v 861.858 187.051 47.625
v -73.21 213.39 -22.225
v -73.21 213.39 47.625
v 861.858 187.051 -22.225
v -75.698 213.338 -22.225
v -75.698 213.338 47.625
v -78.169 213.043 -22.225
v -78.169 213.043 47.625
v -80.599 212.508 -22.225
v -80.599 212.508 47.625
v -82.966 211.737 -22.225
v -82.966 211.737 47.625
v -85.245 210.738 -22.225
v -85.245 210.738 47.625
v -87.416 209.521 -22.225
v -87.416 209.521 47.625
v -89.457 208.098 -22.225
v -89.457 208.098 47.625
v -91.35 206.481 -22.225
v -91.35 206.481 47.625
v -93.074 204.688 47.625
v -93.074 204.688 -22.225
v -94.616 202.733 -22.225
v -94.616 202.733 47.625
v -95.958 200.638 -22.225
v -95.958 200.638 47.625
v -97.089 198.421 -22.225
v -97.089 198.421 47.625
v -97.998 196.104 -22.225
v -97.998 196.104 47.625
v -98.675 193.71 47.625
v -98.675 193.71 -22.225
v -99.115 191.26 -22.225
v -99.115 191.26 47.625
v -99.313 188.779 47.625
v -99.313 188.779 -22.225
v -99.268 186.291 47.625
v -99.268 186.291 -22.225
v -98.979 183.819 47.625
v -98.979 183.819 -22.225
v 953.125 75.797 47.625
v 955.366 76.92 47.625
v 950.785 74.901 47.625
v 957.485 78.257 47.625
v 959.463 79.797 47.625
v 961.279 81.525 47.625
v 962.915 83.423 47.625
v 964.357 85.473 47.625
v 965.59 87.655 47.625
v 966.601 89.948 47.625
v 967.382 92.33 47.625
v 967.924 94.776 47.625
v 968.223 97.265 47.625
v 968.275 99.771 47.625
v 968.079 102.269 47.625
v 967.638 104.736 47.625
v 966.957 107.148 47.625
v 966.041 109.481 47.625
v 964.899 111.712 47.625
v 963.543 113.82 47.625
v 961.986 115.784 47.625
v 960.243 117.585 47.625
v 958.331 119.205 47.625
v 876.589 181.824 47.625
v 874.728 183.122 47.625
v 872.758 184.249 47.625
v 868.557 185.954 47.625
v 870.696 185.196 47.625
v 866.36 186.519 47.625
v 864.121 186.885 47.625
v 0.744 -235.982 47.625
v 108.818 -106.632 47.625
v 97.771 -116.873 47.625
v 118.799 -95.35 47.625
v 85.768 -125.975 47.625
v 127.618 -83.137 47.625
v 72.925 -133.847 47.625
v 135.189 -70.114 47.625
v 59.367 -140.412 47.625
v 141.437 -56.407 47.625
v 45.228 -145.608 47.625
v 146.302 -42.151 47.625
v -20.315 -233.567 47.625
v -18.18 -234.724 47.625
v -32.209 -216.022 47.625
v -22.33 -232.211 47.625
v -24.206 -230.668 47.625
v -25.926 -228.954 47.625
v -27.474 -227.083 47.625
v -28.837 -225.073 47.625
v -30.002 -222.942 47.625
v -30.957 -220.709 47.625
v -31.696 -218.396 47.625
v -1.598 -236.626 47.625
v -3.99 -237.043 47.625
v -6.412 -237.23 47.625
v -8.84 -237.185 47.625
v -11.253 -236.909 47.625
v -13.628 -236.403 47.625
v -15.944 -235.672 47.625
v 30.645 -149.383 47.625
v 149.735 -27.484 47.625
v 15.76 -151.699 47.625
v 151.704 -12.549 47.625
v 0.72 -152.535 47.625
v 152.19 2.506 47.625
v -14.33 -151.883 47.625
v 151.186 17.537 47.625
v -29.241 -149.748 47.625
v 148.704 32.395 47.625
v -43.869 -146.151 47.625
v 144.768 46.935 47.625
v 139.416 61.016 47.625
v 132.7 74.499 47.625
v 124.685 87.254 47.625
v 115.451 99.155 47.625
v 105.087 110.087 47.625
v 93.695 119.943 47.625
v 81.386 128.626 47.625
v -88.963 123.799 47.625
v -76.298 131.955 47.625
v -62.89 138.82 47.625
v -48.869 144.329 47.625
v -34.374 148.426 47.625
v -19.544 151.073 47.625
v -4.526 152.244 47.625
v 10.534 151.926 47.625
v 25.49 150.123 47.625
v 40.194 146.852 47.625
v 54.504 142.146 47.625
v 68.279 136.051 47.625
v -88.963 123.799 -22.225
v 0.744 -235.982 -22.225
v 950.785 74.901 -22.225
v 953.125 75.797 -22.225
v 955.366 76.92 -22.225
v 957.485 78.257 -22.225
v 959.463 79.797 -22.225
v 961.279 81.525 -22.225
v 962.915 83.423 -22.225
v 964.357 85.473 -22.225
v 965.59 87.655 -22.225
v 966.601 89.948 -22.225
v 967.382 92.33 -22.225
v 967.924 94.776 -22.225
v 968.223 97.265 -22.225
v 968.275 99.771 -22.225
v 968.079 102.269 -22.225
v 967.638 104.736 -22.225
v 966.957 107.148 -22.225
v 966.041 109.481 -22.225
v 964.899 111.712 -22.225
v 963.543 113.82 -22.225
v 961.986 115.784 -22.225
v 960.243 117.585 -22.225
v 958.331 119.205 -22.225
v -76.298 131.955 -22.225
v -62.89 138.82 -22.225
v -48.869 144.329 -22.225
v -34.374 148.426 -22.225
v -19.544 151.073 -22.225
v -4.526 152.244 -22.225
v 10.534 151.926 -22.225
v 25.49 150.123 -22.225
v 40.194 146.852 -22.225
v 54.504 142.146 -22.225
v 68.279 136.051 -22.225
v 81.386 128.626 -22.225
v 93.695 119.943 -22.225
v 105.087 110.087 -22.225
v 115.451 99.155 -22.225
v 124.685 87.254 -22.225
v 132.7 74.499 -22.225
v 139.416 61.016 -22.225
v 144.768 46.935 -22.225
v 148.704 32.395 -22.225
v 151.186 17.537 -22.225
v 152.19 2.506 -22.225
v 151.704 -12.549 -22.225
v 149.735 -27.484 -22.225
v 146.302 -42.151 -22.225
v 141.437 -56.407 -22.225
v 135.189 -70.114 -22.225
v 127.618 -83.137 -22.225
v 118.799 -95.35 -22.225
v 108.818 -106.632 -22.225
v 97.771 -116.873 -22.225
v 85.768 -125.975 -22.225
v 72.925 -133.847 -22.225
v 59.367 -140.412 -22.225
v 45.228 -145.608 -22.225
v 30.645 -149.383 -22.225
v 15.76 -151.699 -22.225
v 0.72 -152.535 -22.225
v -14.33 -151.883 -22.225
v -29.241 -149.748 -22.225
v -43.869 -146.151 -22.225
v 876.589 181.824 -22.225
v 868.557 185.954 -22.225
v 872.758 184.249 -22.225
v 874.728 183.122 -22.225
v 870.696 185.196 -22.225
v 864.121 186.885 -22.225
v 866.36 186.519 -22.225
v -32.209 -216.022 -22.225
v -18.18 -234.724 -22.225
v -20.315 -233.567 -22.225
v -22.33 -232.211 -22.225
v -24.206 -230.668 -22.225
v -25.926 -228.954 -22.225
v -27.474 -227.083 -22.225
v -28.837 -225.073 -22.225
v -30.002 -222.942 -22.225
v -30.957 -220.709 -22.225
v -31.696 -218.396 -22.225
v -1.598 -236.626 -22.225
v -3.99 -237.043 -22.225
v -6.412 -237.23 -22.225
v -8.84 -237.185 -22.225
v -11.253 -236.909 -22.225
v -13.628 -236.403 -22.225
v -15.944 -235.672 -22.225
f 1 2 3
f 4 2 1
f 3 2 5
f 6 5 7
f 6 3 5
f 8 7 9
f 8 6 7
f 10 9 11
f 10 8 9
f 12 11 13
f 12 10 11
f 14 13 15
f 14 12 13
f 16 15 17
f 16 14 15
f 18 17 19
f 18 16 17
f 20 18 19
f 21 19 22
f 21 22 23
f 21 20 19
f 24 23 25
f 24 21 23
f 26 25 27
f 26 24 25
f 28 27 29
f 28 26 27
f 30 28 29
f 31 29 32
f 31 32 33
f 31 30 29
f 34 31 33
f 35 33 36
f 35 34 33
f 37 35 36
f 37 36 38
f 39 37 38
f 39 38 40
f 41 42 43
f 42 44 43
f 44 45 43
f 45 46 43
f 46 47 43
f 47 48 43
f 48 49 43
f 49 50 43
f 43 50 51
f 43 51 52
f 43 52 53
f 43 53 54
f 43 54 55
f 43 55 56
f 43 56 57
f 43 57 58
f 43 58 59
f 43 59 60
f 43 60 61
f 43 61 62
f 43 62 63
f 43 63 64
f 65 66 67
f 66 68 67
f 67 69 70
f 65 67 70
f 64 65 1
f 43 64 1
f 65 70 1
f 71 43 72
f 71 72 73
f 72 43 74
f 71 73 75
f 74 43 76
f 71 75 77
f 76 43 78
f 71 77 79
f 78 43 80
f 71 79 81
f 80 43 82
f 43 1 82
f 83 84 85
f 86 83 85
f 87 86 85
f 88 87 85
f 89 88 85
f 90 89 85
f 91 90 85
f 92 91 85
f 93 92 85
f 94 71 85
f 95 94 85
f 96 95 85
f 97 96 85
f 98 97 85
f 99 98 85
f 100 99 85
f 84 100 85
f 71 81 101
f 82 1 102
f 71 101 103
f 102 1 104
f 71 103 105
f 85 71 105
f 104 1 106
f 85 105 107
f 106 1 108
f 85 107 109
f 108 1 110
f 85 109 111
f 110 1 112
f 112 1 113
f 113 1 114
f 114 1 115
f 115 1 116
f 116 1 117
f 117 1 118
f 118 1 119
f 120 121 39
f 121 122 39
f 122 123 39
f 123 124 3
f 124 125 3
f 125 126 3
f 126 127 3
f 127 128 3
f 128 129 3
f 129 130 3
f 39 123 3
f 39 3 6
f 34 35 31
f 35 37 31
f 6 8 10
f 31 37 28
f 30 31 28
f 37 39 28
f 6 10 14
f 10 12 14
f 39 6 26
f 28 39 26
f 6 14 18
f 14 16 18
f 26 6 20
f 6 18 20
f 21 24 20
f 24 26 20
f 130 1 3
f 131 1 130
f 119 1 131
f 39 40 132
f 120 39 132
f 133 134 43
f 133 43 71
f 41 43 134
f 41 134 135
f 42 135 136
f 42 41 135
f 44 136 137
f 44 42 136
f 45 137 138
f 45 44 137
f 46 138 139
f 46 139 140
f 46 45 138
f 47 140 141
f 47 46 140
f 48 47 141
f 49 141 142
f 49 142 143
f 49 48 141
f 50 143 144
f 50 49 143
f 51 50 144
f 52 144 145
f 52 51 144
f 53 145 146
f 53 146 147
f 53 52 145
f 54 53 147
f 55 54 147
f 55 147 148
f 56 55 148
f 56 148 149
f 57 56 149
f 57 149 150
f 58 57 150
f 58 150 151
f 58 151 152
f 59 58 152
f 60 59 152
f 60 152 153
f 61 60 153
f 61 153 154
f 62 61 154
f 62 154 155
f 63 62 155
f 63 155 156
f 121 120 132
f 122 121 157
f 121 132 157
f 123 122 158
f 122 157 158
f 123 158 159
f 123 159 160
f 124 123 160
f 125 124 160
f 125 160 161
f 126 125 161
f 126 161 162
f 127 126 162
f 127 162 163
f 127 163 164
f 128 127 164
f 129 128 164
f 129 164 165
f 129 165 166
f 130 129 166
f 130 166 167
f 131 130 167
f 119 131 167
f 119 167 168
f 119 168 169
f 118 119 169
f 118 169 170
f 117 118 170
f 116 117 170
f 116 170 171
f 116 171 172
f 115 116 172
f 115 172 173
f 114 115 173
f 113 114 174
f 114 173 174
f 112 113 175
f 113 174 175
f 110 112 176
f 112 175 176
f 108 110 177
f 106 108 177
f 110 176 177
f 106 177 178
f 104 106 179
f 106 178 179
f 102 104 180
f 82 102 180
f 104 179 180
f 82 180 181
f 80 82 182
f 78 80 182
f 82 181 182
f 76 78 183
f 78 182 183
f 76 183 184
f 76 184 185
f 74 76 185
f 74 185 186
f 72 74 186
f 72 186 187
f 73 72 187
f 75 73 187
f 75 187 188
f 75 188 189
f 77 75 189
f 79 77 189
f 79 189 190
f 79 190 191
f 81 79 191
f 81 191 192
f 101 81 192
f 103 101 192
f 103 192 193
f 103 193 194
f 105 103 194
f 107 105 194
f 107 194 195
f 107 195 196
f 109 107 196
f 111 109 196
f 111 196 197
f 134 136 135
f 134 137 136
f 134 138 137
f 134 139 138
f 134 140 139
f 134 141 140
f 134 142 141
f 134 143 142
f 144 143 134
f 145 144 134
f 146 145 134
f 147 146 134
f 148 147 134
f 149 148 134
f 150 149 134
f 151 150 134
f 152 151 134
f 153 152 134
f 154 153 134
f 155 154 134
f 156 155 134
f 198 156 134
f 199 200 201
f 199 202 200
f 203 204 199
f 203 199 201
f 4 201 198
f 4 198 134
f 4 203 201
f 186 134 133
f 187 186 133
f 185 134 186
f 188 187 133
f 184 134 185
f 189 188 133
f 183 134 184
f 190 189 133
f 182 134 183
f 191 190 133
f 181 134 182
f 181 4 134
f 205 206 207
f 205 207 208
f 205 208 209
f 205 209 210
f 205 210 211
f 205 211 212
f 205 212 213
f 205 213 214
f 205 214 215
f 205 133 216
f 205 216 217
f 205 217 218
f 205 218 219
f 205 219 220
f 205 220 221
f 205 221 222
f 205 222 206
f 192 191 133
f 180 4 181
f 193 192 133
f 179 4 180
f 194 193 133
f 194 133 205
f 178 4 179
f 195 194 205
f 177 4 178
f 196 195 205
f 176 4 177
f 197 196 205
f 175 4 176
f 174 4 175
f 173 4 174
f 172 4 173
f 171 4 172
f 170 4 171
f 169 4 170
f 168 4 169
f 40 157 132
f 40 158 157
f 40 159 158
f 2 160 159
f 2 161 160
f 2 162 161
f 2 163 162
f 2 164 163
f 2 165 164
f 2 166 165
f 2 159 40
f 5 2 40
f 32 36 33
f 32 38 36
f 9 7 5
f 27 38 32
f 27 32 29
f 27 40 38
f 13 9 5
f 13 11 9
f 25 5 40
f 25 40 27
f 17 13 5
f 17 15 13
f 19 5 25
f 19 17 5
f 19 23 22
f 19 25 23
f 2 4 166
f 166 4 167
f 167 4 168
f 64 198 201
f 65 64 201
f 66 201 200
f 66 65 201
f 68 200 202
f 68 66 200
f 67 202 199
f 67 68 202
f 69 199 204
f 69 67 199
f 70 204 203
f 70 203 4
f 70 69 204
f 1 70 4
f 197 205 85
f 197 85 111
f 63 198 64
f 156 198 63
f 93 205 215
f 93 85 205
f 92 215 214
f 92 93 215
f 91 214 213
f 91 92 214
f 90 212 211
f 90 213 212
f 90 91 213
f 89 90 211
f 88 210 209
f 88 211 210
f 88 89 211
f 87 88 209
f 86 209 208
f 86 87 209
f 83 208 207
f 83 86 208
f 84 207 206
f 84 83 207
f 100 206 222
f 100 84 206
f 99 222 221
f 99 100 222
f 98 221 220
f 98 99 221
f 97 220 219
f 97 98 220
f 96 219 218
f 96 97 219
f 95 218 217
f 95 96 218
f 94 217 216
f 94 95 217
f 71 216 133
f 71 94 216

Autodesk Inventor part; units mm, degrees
ref_plane "YZ Plane" through (0, 0, 0) normal (1, 0, 0) x (0, 1, 0)
ref_plane "XZ Plane" through (0, 0, 0) normal (0, 1, 0) x (-1, 0, 0)
ref_plane "XY Plane" through (0, 0, 0) normal (0, 0, 1) x (1, 0, 0)
ref_plane "Work Plane1" through (0, 0, -22.225) normal (0, 0, -1) x (-1, 0, 0)
sketch "Sketch1" plane through (0, 0, -22.225) normal (0, 0, -1) x (-1, 0, 0)
  arc A0 (88.9626, 123.799) -> (43.8693, -146.1511) centre (0.2092, -0.1167) ccw
  line L0 (104.0584, 214.2592) -> (-870.0682, 186.8193)
  line L1 (-870.0682, 186.8193) -> (-996.5964, 89.8924)
  line L2 (-996.5964, 89.8924) -> (27.3448, -245.173)
  line L3 (104.0584, 214.2592) -> (88.9626, 123.799)
  line L4 (27.3448, -245.173) -> (43.8693, -146.1511)
extrude "Extrusion1" add sketch "Sketch1" against normal blind 69.85
fillet "Fillet1" radius 25.4 1 edges at (-104.0584, 214.2592, 12.7)
fillet "Fillet2" radius 25.4 1 edges at (-27.3448, -245.173, 12.7)
fillet "Fillet3" radius 25.4 2 edges at (996.5964, 89.8924, 12.7) (870.0682, 186.8193, 12.7)
properties material "Wood (Walnut)"
